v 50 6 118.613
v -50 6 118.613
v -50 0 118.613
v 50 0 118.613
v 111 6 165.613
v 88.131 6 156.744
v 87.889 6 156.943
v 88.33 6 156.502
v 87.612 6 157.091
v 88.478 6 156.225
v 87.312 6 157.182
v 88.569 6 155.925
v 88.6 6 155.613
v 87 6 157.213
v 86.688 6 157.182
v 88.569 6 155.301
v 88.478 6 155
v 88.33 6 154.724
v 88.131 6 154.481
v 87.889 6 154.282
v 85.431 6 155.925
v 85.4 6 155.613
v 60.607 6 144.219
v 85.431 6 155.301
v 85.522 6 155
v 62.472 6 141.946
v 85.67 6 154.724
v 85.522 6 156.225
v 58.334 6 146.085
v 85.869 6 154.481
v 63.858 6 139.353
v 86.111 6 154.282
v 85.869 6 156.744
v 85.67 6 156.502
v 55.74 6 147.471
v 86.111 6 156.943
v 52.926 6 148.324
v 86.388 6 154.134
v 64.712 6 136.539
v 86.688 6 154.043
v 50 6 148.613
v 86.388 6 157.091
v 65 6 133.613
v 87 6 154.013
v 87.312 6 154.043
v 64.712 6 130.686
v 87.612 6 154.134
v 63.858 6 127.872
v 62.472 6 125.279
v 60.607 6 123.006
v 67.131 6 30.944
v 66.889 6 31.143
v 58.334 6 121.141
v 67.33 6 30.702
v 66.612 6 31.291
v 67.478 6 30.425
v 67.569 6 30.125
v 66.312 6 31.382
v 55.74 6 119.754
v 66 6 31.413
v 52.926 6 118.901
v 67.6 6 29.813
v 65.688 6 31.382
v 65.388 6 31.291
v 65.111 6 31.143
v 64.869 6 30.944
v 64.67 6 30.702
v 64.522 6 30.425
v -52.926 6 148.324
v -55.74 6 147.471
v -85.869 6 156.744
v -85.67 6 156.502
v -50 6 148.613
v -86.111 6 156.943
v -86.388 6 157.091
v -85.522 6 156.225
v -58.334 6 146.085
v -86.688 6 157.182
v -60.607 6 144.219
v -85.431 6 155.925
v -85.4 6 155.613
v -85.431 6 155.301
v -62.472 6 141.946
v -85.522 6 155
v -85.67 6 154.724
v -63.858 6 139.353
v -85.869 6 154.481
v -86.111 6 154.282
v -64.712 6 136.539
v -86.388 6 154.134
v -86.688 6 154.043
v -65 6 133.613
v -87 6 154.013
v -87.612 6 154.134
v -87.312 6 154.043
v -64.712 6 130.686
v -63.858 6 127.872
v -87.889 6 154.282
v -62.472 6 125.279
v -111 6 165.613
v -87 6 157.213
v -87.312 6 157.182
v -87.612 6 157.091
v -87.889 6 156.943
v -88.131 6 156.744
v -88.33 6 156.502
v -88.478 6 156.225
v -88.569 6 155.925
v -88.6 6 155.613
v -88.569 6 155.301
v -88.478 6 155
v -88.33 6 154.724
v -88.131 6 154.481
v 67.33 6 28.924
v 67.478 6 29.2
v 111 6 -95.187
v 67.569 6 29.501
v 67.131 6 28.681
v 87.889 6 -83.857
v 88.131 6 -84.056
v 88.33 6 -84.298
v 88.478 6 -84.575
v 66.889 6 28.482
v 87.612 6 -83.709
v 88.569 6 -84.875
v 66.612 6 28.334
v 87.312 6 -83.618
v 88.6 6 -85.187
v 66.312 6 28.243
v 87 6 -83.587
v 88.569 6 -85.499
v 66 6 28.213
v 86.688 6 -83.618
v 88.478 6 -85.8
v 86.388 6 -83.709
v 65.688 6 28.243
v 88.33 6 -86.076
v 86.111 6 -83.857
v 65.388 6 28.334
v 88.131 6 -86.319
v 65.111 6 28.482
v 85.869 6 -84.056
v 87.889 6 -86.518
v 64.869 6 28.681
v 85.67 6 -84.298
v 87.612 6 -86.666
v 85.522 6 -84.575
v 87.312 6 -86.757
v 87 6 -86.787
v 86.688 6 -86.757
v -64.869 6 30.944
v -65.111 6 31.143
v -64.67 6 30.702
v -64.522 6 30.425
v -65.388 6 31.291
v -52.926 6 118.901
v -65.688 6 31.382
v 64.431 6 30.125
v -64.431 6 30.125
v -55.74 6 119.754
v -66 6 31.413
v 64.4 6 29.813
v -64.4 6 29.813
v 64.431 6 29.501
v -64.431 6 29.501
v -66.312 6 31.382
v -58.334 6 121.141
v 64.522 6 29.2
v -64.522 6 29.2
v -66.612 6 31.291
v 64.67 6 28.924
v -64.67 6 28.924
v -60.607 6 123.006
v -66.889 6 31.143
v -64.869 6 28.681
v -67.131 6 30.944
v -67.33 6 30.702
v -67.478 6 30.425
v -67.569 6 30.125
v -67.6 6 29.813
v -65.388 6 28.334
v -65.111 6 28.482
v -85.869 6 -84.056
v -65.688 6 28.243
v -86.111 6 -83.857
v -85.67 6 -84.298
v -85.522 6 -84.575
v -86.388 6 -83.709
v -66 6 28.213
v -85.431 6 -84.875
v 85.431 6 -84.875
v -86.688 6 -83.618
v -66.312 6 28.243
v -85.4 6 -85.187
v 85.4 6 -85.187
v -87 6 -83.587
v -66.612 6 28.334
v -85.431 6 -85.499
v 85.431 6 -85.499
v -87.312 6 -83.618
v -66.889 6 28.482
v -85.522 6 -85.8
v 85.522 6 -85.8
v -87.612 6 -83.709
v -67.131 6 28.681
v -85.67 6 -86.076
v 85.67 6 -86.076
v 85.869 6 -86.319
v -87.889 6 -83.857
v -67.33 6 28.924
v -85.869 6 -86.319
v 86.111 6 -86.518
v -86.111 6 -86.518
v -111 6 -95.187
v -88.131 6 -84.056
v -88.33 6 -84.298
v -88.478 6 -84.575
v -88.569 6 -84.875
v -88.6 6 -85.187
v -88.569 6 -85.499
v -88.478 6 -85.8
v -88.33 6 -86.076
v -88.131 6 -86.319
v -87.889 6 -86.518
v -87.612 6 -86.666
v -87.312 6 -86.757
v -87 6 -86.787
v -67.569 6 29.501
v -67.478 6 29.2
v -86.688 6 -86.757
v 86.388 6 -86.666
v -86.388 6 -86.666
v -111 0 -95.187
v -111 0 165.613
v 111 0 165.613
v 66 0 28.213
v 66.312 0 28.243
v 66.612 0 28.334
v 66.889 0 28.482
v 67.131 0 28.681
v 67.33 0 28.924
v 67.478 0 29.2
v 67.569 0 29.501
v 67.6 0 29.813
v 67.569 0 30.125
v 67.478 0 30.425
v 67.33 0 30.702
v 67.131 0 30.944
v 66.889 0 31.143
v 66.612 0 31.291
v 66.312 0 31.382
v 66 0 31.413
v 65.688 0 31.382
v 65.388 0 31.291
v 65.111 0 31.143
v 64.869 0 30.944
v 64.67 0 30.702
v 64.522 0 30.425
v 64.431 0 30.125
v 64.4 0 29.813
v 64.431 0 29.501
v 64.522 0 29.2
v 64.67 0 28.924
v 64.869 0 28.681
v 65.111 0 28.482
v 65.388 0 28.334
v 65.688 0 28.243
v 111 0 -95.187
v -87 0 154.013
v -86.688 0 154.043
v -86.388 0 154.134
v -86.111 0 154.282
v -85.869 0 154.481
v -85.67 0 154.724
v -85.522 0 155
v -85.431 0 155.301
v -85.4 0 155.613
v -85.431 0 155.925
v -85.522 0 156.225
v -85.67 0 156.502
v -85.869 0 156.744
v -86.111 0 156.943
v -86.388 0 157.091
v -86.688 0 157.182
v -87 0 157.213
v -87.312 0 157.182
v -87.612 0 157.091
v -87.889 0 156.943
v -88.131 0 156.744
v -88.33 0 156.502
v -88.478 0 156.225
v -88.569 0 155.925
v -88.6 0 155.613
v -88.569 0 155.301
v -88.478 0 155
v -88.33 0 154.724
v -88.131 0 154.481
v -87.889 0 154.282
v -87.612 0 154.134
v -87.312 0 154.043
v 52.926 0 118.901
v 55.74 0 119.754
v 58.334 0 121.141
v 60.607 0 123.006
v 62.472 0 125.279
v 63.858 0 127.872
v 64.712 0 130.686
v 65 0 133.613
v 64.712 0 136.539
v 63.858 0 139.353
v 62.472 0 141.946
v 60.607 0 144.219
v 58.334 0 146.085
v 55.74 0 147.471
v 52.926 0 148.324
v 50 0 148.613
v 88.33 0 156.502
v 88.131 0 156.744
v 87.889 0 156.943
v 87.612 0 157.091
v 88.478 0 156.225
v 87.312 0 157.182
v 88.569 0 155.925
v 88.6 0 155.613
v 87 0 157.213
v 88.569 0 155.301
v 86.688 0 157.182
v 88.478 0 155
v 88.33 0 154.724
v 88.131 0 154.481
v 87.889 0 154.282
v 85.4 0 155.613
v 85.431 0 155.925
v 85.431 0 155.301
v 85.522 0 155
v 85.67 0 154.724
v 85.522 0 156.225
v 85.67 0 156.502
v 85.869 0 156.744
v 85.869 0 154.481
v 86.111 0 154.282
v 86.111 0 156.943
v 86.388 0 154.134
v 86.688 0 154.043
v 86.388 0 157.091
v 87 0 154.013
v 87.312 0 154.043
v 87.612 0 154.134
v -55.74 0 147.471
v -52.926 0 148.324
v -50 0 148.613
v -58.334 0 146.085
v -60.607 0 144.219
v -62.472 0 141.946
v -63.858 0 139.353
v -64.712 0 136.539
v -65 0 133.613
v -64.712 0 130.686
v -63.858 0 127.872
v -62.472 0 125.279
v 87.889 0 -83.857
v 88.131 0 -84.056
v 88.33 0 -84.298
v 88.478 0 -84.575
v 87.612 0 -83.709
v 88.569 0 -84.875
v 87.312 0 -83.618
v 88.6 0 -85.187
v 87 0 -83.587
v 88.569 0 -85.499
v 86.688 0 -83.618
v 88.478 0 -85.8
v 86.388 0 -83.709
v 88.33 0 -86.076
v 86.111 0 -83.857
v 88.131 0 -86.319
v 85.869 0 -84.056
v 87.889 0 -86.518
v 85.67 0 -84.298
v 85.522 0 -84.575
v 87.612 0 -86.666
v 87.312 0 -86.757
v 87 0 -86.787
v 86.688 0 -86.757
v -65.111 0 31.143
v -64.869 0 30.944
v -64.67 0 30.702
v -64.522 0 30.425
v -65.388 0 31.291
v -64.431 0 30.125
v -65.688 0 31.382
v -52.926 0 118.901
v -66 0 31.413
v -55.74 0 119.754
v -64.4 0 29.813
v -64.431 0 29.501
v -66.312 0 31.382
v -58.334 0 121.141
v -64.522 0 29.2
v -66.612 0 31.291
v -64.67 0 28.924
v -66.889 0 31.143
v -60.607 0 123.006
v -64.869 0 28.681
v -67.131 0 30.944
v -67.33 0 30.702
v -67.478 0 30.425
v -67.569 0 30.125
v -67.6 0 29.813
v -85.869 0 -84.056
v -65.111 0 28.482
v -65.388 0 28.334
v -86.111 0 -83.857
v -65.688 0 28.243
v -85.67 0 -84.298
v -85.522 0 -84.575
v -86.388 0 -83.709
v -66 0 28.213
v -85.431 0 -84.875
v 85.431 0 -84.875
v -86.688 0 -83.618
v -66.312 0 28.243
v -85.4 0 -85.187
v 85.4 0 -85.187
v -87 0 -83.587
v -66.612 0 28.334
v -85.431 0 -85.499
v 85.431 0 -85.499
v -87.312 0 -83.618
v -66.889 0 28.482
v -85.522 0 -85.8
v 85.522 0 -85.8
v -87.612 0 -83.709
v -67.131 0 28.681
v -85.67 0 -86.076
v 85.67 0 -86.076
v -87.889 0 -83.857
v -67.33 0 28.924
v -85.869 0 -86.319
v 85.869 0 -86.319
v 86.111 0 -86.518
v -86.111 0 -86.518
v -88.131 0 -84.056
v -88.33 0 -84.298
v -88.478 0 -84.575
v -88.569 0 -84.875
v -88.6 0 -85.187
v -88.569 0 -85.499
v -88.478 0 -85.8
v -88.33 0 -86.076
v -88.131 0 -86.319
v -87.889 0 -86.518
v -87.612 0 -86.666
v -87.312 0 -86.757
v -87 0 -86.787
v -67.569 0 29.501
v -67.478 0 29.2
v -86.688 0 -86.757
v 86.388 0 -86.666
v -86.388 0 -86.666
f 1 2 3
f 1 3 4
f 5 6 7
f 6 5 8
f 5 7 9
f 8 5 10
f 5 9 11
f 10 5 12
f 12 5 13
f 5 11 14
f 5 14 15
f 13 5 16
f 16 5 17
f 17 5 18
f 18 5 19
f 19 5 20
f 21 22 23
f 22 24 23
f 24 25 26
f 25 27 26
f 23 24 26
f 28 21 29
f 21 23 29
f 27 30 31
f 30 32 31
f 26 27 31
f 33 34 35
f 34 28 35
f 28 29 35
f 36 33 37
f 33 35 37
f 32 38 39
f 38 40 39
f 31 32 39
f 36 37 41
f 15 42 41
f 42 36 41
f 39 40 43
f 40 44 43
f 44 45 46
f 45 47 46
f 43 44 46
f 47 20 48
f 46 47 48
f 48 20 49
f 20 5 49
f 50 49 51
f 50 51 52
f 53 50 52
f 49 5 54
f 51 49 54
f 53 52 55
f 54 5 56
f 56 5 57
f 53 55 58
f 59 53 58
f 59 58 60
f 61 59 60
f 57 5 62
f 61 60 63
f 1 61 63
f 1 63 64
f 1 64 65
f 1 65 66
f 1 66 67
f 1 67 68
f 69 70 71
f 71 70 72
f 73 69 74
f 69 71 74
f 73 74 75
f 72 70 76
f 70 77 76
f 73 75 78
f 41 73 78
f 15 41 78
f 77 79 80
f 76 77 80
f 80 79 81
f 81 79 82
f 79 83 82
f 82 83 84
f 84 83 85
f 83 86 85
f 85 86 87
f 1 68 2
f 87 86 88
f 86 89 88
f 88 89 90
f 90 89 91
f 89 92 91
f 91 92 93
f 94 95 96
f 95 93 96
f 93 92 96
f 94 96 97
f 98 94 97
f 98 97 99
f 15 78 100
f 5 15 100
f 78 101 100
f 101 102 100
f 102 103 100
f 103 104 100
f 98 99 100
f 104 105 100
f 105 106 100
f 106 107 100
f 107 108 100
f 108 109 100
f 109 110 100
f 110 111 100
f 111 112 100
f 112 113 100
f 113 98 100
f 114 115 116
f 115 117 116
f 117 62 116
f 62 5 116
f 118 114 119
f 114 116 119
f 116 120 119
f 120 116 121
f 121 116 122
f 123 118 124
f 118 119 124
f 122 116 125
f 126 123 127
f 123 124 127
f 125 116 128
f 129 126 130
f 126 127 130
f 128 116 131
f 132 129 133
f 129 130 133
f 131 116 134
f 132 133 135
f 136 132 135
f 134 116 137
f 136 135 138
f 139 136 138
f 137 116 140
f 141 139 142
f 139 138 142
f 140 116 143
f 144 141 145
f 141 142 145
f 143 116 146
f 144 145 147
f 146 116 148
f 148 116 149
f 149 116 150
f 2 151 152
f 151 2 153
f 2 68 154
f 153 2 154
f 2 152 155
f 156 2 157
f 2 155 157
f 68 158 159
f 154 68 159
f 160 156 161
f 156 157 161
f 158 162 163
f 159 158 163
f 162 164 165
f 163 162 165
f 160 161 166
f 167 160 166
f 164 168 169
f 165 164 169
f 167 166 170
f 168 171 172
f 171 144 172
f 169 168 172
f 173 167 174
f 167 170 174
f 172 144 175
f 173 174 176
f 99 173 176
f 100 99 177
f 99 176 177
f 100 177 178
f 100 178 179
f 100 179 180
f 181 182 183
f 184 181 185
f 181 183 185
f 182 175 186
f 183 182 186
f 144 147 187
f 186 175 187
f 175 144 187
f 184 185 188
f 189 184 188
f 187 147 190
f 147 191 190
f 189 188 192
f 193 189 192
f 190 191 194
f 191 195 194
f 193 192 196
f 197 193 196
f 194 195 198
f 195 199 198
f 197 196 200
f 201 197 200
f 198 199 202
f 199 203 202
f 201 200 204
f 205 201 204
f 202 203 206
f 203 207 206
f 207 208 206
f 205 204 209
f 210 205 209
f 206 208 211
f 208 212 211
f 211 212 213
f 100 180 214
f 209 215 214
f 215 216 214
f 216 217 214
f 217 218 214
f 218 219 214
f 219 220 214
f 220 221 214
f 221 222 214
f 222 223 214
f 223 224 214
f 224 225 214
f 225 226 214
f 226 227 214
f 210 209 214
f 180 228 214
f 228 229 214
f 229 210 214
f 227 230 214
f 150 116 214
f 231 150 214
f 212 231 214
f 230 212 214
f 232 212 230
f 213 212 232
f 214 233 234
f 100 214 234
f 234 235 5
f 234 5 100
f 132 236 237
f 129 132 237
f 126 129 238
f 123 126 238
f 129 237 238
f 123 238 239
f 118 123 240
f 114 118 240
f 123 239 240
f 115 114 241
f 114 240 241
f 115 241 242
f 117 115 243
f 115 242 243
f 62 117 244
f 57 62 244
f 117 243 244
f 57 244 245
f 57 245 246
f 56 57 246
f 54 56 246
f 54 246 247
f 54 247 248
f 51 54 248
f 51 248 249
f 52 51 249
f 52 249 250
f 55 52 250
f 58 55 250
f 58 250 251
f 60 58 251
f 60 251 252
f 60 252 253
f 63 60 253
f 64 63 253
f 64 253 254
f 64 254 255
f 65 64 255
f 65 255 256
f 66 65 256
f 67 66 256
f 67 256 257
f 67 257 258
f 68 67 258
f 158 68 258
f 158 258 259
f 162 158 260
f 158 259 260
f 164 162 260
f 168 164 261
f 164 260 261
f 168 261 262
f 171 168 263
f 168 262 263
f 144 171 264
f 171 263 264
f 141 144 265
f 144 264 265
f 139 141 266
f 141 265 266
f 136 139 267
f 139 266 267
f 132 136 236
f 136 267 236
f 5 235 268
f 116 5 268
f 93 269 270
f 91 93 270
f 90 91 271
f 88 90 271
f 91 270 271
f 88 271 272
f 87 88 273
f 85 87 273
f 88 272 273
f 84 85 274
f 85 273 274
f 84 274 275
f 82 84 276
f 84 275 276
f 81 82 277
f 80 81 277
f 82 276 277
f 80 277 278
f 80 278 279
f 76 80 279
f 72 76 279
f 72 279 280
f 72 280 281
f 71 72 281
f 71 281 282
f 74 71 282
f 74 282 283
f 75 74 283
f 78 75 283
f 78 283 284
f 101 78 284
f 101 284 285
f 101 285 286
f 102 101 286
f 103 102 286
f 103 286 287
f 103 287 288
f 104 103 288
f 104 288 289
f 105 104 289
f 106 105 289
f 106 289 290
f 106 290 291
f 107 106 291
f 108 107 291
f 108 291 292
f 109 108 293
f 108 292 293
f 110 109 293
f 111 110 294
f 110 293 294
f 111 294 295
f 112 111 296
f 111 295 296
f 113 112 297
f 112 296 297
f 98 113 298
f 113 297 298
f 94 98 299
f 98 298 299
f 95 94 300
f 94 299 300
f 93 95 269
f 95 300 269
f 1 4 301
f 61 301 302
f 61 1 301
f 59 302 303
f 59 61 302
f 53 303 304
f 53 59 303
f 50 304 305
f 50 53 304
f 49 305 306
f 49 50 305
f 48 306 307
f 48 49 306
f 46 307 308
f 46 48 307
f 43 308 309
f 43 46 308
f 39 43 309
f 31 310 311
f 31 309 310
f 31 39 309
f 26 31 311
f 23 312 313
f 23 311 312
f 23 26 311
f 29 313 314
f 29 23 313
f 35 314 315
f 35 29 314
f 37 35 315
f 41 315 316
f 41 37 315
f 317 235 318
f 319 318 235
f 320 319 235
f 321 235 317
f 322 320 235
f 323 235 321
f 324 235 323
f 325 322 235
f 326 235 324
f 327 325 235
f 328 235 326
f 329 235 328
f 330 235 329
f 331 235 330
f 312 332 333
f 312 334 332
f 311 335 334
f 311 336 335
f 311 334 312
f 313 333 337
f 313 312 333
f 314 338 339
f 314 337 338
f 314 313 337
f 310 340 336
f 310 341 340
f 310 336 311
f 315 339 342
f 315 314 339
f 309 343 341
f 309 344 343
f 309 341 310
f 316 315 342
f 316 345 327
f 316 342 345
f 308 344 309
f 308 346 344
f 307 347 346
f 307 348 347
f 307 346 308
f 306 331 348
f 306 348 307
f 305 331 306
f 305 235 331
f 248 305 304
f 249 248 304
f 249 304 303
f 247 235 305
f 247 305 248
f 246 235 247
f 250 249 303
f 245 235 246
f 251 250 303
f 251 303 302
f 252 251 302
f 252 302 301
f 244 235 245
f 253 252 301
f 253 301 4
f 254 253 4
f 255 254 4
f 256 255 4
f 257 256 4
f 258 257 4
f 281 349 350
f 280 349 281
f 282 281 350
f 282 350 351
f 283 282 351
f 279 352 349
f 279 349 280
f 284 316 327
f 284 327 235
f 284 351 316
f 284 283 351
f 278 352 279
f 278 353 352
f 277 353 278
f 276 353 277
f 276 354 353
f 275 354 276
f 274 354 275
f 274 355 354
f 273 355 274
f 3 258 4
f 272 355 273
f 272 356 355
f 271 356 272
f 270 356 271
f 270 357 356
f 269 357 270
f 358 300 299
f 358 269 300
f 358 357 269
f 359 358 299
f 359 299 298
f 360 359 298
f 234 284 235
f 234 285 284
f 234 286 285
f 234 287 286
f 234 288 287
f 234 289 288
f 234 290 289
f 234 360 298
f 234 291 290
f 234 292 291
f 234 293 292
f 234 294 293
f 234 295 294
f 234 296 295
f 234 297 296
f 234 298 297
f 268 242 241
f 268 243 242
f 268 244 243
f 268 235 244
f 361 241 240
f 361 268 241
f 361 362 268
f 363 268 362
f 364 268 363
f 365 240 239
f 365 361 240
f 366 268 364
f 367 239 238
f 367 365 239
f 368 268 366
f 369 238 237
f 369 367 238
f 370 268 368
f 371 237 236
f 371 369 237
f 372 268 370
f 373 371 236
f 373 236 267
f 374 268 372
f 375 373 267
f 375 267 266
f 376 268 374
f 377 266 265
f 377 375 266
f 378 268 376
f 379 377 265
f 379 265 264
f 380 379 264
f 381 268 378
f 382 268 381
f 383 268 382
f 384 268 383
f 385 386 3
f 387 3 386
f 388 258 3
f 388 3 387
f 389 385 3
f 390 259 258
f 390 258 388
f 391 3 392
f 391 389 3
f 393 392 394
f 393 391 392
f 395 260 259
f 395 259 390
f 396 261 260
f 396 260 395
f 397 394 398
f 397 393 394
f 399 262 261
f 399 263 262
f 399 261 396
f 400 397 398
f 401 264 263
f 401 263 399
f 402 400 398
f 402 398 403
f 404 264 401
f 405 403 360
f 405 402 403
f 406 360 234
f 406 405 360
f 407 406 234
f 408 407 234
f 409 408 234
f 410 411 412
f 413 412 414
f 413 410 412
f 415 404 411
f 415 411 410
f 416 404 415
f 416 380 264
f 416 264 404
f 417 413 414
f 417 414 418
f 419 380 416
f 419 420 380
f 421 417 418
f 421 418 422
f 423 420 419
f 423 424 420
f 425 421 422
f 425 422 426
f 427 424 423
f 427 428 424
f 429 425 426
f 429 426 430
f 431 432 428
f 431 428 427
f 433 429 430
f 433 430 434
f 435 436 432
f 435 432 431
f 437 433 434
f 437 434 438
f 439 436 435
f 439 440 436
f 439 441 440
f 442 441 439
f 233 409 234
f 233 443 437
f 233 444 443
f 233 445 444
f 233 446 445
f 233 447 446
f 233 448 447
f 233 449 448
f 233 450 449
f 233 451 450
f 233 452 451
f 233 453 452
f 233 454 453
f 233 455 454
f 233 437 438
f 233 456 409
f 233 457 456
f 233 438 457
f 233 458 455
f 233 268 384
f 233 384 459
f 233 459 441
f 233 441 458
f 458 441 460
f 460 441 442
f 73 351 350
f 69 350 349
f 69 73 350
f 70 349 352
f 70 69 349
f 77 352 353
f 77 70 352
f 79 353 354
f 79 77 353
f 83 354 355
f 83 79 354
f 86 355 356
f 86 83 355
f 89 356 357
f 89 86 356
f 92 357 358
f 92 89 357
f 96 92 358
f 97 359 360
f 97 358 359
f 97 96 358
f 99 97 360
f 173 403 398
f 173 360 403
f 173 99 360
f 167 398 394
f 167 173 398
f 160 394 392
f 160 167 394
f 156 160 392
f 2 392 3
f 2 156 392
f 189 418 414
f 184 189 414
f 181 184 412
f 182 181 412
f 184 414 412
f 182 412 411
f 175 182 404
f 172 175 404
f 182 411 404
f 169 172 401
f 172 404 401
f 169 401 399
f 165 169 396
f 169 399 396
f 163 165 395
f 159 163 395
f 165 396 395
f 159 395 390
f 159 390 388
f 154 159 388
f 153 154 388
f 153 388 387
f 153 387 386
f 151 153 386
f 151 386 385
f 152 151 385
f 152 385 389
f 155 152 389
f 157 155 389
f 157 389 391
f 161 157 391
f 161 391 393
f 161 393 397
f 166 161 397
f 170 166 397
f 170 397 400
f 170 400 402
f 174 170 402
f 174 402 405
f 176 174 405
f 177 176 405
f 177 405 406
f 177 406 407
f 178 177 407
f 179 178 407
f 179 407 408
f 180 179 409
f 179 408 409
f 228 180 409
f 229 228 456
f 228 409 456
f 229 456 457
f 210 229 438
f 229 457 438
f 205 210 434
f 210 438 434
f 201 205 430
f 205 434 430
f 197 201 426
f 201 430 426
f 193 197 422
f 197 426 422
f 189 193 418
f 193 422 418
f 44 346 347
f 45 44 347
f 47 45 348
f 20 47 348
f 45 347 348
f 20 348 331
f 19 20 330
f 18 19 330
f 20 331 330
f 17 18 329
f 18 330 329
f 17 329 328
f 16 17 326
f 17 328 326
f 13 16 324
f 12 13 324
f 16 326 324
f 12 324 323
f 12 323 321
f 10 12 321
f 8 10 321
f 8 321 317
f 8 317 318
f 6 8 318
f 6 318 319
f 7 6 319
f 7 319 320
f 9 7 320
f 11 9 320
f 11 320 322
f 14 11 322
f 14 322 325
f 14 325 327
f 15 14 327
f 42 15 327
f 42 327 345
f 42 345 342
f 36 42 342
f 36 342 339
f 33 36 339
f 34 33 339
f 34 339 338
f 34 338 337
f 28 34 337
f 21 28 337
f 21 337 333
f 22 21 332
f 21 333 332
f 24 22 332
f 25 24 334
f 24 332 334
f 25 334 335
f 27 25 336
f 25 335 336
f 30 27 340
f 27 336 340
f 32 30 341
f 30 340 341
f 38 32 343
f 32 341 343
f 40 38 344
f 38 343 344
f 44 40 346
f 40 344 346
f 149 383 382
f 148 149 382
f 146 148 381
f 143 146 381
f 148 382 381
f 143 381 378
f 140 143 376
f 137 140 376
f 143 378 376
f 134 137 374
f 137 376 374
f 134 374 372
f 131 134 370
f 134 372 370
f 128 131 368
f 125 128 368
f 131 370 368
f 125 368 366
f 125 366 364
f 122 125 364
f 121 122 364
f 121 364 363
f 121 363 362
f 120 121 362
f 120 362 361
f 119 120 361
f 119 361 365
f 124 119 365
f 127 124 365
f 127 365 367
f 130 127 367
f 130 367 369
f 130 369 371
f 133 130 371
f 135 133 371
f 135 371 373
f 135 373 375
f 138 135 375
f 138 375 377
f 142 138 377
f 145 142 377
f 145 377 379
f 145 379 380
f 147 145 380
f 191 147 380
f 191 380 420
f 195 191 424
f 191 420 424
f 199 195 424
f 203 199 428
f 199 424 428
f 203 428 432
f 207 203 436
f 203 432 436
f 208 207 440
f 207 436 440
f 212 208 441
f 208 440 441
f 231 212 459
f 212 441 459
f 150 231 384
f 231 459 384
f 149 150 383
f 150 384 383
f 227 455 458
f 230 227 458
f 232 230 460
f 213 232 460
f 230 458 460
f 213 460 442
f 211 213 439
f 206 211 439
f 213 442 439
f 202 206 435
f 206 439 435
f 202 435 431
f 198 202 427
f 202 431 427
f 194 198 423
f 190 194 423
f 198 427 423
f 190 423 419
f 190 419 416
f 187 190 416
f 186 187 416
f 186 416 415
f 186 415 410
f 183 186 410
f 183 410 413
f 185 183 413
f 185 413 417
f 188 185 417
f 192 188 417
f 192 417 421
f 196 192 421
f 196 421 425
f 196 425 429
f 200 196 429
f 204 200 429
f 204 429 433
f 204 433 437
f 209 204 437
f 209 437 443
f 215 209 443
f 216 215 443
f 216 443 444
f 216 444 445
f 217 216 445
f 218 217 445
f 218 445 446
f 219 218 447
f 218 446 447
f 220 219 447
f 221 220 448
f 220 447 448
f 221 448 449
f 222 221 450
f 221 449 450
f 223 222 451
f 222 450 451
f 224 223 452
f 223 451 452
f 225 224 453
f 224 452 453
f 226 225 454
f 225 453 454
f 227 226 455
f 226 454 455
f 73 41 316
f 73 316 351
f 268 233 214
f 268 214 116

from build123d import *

# Parameters (mm, degrees)
BOSS_EXTRUDE1_DEPTH = 6
SKETCH3_R           = 1.6
SKETCH3_W           = 222
SKETCH3_H           = 30.425305758
CUT_EXTRUDE1_DEPTH  = 10
SKETCH4_R           = 1.6
CUT_EXTRUDE2_DEPTH  = 10
CUT_EXTRUDE3_DEPTH  = 10


with BuildPart() as part:
    # Sketch1 → Boss-Extrude1 (new body)
    with BuildSketch(Plane(origin=(0, 0, 0), x_dir=(1, 0, 0), z_dir=(0, 1, 0))):
        Polygon((-111, 125.612652879), (111, 125.612652879), (111, -125.612652879), (111, -165.612652879), (-111, -165.612652879), (-111, -125.612652879), align=None)
    extrude(amount=BOSS_EXTRUDE1_DEPTH)

    # Sketch3 → Cut-Extrude1 (cut)
    with BuildSketch(Plane.XZ):
        with Locations(Location((66, 29.812652879, 0), (0, 0, 270))):
            Circle(SKETCH3_R)
        with Locations(Location((-66, 29.812652879, 0), (0, 0, 270))):
            Circle(SKETCH3_R)
        with Locations((0, -110.4)):
            Rectangle(SKETCH3_W, SKETCH3_H)
    extrude(amount=-CUT_EXTRUDE1_DEPTH, mode=Mode.SUBTRACT)

    # Sketch4 → Cut-Extrude2 (cut)
    with BuildSketch(Plane.XZ):
        with Locations(Location((87, 155.612652879, 0), (0, 0, 270))):
            Circle(SKETCH4_R)
        with Locations(Location((-87, 155.612652879, 0), (0, 0, 270))):
            Circle(SKETCH4_R)
        with Locations(Location((87, -85.187347121, 0), (0, 0, 270))):
            Circle(SKETCH4_R)
        with Locations(Location((-87, -85.187347121, 0), (0, 0, 270))):
            Circle(SKETCH4_R)
    extrude(amount=-CUT_EXTRUDE2_DEPTH, mode=Mode.SUBTRACT)

    # Sketch5 → Cut-Extrude3 (cut)
    with BuildSketch(Plane(origin=(0, 6, 0), x_dir=(1, 0, 0), z_dir=(0, 1, 0))):
        with BuildLine():
            Line((-50, -118.612652879), (50, -118.612652879))
            ThreePointArc((50, -118.612652879), (65, -133.612652879), (50, -148.612652879))
            Line((50, -148.612652879), (-50, -148.612652879))
            ThreePointArc((-50, -148.612652879), (-65, -133.612652879), (-50, -118.612652879))
        make_face()
    extrude(amount=-CUT_EXTRUDE3_DEPTH, mode=Mode.SUBTRACT)


solid = part.part
